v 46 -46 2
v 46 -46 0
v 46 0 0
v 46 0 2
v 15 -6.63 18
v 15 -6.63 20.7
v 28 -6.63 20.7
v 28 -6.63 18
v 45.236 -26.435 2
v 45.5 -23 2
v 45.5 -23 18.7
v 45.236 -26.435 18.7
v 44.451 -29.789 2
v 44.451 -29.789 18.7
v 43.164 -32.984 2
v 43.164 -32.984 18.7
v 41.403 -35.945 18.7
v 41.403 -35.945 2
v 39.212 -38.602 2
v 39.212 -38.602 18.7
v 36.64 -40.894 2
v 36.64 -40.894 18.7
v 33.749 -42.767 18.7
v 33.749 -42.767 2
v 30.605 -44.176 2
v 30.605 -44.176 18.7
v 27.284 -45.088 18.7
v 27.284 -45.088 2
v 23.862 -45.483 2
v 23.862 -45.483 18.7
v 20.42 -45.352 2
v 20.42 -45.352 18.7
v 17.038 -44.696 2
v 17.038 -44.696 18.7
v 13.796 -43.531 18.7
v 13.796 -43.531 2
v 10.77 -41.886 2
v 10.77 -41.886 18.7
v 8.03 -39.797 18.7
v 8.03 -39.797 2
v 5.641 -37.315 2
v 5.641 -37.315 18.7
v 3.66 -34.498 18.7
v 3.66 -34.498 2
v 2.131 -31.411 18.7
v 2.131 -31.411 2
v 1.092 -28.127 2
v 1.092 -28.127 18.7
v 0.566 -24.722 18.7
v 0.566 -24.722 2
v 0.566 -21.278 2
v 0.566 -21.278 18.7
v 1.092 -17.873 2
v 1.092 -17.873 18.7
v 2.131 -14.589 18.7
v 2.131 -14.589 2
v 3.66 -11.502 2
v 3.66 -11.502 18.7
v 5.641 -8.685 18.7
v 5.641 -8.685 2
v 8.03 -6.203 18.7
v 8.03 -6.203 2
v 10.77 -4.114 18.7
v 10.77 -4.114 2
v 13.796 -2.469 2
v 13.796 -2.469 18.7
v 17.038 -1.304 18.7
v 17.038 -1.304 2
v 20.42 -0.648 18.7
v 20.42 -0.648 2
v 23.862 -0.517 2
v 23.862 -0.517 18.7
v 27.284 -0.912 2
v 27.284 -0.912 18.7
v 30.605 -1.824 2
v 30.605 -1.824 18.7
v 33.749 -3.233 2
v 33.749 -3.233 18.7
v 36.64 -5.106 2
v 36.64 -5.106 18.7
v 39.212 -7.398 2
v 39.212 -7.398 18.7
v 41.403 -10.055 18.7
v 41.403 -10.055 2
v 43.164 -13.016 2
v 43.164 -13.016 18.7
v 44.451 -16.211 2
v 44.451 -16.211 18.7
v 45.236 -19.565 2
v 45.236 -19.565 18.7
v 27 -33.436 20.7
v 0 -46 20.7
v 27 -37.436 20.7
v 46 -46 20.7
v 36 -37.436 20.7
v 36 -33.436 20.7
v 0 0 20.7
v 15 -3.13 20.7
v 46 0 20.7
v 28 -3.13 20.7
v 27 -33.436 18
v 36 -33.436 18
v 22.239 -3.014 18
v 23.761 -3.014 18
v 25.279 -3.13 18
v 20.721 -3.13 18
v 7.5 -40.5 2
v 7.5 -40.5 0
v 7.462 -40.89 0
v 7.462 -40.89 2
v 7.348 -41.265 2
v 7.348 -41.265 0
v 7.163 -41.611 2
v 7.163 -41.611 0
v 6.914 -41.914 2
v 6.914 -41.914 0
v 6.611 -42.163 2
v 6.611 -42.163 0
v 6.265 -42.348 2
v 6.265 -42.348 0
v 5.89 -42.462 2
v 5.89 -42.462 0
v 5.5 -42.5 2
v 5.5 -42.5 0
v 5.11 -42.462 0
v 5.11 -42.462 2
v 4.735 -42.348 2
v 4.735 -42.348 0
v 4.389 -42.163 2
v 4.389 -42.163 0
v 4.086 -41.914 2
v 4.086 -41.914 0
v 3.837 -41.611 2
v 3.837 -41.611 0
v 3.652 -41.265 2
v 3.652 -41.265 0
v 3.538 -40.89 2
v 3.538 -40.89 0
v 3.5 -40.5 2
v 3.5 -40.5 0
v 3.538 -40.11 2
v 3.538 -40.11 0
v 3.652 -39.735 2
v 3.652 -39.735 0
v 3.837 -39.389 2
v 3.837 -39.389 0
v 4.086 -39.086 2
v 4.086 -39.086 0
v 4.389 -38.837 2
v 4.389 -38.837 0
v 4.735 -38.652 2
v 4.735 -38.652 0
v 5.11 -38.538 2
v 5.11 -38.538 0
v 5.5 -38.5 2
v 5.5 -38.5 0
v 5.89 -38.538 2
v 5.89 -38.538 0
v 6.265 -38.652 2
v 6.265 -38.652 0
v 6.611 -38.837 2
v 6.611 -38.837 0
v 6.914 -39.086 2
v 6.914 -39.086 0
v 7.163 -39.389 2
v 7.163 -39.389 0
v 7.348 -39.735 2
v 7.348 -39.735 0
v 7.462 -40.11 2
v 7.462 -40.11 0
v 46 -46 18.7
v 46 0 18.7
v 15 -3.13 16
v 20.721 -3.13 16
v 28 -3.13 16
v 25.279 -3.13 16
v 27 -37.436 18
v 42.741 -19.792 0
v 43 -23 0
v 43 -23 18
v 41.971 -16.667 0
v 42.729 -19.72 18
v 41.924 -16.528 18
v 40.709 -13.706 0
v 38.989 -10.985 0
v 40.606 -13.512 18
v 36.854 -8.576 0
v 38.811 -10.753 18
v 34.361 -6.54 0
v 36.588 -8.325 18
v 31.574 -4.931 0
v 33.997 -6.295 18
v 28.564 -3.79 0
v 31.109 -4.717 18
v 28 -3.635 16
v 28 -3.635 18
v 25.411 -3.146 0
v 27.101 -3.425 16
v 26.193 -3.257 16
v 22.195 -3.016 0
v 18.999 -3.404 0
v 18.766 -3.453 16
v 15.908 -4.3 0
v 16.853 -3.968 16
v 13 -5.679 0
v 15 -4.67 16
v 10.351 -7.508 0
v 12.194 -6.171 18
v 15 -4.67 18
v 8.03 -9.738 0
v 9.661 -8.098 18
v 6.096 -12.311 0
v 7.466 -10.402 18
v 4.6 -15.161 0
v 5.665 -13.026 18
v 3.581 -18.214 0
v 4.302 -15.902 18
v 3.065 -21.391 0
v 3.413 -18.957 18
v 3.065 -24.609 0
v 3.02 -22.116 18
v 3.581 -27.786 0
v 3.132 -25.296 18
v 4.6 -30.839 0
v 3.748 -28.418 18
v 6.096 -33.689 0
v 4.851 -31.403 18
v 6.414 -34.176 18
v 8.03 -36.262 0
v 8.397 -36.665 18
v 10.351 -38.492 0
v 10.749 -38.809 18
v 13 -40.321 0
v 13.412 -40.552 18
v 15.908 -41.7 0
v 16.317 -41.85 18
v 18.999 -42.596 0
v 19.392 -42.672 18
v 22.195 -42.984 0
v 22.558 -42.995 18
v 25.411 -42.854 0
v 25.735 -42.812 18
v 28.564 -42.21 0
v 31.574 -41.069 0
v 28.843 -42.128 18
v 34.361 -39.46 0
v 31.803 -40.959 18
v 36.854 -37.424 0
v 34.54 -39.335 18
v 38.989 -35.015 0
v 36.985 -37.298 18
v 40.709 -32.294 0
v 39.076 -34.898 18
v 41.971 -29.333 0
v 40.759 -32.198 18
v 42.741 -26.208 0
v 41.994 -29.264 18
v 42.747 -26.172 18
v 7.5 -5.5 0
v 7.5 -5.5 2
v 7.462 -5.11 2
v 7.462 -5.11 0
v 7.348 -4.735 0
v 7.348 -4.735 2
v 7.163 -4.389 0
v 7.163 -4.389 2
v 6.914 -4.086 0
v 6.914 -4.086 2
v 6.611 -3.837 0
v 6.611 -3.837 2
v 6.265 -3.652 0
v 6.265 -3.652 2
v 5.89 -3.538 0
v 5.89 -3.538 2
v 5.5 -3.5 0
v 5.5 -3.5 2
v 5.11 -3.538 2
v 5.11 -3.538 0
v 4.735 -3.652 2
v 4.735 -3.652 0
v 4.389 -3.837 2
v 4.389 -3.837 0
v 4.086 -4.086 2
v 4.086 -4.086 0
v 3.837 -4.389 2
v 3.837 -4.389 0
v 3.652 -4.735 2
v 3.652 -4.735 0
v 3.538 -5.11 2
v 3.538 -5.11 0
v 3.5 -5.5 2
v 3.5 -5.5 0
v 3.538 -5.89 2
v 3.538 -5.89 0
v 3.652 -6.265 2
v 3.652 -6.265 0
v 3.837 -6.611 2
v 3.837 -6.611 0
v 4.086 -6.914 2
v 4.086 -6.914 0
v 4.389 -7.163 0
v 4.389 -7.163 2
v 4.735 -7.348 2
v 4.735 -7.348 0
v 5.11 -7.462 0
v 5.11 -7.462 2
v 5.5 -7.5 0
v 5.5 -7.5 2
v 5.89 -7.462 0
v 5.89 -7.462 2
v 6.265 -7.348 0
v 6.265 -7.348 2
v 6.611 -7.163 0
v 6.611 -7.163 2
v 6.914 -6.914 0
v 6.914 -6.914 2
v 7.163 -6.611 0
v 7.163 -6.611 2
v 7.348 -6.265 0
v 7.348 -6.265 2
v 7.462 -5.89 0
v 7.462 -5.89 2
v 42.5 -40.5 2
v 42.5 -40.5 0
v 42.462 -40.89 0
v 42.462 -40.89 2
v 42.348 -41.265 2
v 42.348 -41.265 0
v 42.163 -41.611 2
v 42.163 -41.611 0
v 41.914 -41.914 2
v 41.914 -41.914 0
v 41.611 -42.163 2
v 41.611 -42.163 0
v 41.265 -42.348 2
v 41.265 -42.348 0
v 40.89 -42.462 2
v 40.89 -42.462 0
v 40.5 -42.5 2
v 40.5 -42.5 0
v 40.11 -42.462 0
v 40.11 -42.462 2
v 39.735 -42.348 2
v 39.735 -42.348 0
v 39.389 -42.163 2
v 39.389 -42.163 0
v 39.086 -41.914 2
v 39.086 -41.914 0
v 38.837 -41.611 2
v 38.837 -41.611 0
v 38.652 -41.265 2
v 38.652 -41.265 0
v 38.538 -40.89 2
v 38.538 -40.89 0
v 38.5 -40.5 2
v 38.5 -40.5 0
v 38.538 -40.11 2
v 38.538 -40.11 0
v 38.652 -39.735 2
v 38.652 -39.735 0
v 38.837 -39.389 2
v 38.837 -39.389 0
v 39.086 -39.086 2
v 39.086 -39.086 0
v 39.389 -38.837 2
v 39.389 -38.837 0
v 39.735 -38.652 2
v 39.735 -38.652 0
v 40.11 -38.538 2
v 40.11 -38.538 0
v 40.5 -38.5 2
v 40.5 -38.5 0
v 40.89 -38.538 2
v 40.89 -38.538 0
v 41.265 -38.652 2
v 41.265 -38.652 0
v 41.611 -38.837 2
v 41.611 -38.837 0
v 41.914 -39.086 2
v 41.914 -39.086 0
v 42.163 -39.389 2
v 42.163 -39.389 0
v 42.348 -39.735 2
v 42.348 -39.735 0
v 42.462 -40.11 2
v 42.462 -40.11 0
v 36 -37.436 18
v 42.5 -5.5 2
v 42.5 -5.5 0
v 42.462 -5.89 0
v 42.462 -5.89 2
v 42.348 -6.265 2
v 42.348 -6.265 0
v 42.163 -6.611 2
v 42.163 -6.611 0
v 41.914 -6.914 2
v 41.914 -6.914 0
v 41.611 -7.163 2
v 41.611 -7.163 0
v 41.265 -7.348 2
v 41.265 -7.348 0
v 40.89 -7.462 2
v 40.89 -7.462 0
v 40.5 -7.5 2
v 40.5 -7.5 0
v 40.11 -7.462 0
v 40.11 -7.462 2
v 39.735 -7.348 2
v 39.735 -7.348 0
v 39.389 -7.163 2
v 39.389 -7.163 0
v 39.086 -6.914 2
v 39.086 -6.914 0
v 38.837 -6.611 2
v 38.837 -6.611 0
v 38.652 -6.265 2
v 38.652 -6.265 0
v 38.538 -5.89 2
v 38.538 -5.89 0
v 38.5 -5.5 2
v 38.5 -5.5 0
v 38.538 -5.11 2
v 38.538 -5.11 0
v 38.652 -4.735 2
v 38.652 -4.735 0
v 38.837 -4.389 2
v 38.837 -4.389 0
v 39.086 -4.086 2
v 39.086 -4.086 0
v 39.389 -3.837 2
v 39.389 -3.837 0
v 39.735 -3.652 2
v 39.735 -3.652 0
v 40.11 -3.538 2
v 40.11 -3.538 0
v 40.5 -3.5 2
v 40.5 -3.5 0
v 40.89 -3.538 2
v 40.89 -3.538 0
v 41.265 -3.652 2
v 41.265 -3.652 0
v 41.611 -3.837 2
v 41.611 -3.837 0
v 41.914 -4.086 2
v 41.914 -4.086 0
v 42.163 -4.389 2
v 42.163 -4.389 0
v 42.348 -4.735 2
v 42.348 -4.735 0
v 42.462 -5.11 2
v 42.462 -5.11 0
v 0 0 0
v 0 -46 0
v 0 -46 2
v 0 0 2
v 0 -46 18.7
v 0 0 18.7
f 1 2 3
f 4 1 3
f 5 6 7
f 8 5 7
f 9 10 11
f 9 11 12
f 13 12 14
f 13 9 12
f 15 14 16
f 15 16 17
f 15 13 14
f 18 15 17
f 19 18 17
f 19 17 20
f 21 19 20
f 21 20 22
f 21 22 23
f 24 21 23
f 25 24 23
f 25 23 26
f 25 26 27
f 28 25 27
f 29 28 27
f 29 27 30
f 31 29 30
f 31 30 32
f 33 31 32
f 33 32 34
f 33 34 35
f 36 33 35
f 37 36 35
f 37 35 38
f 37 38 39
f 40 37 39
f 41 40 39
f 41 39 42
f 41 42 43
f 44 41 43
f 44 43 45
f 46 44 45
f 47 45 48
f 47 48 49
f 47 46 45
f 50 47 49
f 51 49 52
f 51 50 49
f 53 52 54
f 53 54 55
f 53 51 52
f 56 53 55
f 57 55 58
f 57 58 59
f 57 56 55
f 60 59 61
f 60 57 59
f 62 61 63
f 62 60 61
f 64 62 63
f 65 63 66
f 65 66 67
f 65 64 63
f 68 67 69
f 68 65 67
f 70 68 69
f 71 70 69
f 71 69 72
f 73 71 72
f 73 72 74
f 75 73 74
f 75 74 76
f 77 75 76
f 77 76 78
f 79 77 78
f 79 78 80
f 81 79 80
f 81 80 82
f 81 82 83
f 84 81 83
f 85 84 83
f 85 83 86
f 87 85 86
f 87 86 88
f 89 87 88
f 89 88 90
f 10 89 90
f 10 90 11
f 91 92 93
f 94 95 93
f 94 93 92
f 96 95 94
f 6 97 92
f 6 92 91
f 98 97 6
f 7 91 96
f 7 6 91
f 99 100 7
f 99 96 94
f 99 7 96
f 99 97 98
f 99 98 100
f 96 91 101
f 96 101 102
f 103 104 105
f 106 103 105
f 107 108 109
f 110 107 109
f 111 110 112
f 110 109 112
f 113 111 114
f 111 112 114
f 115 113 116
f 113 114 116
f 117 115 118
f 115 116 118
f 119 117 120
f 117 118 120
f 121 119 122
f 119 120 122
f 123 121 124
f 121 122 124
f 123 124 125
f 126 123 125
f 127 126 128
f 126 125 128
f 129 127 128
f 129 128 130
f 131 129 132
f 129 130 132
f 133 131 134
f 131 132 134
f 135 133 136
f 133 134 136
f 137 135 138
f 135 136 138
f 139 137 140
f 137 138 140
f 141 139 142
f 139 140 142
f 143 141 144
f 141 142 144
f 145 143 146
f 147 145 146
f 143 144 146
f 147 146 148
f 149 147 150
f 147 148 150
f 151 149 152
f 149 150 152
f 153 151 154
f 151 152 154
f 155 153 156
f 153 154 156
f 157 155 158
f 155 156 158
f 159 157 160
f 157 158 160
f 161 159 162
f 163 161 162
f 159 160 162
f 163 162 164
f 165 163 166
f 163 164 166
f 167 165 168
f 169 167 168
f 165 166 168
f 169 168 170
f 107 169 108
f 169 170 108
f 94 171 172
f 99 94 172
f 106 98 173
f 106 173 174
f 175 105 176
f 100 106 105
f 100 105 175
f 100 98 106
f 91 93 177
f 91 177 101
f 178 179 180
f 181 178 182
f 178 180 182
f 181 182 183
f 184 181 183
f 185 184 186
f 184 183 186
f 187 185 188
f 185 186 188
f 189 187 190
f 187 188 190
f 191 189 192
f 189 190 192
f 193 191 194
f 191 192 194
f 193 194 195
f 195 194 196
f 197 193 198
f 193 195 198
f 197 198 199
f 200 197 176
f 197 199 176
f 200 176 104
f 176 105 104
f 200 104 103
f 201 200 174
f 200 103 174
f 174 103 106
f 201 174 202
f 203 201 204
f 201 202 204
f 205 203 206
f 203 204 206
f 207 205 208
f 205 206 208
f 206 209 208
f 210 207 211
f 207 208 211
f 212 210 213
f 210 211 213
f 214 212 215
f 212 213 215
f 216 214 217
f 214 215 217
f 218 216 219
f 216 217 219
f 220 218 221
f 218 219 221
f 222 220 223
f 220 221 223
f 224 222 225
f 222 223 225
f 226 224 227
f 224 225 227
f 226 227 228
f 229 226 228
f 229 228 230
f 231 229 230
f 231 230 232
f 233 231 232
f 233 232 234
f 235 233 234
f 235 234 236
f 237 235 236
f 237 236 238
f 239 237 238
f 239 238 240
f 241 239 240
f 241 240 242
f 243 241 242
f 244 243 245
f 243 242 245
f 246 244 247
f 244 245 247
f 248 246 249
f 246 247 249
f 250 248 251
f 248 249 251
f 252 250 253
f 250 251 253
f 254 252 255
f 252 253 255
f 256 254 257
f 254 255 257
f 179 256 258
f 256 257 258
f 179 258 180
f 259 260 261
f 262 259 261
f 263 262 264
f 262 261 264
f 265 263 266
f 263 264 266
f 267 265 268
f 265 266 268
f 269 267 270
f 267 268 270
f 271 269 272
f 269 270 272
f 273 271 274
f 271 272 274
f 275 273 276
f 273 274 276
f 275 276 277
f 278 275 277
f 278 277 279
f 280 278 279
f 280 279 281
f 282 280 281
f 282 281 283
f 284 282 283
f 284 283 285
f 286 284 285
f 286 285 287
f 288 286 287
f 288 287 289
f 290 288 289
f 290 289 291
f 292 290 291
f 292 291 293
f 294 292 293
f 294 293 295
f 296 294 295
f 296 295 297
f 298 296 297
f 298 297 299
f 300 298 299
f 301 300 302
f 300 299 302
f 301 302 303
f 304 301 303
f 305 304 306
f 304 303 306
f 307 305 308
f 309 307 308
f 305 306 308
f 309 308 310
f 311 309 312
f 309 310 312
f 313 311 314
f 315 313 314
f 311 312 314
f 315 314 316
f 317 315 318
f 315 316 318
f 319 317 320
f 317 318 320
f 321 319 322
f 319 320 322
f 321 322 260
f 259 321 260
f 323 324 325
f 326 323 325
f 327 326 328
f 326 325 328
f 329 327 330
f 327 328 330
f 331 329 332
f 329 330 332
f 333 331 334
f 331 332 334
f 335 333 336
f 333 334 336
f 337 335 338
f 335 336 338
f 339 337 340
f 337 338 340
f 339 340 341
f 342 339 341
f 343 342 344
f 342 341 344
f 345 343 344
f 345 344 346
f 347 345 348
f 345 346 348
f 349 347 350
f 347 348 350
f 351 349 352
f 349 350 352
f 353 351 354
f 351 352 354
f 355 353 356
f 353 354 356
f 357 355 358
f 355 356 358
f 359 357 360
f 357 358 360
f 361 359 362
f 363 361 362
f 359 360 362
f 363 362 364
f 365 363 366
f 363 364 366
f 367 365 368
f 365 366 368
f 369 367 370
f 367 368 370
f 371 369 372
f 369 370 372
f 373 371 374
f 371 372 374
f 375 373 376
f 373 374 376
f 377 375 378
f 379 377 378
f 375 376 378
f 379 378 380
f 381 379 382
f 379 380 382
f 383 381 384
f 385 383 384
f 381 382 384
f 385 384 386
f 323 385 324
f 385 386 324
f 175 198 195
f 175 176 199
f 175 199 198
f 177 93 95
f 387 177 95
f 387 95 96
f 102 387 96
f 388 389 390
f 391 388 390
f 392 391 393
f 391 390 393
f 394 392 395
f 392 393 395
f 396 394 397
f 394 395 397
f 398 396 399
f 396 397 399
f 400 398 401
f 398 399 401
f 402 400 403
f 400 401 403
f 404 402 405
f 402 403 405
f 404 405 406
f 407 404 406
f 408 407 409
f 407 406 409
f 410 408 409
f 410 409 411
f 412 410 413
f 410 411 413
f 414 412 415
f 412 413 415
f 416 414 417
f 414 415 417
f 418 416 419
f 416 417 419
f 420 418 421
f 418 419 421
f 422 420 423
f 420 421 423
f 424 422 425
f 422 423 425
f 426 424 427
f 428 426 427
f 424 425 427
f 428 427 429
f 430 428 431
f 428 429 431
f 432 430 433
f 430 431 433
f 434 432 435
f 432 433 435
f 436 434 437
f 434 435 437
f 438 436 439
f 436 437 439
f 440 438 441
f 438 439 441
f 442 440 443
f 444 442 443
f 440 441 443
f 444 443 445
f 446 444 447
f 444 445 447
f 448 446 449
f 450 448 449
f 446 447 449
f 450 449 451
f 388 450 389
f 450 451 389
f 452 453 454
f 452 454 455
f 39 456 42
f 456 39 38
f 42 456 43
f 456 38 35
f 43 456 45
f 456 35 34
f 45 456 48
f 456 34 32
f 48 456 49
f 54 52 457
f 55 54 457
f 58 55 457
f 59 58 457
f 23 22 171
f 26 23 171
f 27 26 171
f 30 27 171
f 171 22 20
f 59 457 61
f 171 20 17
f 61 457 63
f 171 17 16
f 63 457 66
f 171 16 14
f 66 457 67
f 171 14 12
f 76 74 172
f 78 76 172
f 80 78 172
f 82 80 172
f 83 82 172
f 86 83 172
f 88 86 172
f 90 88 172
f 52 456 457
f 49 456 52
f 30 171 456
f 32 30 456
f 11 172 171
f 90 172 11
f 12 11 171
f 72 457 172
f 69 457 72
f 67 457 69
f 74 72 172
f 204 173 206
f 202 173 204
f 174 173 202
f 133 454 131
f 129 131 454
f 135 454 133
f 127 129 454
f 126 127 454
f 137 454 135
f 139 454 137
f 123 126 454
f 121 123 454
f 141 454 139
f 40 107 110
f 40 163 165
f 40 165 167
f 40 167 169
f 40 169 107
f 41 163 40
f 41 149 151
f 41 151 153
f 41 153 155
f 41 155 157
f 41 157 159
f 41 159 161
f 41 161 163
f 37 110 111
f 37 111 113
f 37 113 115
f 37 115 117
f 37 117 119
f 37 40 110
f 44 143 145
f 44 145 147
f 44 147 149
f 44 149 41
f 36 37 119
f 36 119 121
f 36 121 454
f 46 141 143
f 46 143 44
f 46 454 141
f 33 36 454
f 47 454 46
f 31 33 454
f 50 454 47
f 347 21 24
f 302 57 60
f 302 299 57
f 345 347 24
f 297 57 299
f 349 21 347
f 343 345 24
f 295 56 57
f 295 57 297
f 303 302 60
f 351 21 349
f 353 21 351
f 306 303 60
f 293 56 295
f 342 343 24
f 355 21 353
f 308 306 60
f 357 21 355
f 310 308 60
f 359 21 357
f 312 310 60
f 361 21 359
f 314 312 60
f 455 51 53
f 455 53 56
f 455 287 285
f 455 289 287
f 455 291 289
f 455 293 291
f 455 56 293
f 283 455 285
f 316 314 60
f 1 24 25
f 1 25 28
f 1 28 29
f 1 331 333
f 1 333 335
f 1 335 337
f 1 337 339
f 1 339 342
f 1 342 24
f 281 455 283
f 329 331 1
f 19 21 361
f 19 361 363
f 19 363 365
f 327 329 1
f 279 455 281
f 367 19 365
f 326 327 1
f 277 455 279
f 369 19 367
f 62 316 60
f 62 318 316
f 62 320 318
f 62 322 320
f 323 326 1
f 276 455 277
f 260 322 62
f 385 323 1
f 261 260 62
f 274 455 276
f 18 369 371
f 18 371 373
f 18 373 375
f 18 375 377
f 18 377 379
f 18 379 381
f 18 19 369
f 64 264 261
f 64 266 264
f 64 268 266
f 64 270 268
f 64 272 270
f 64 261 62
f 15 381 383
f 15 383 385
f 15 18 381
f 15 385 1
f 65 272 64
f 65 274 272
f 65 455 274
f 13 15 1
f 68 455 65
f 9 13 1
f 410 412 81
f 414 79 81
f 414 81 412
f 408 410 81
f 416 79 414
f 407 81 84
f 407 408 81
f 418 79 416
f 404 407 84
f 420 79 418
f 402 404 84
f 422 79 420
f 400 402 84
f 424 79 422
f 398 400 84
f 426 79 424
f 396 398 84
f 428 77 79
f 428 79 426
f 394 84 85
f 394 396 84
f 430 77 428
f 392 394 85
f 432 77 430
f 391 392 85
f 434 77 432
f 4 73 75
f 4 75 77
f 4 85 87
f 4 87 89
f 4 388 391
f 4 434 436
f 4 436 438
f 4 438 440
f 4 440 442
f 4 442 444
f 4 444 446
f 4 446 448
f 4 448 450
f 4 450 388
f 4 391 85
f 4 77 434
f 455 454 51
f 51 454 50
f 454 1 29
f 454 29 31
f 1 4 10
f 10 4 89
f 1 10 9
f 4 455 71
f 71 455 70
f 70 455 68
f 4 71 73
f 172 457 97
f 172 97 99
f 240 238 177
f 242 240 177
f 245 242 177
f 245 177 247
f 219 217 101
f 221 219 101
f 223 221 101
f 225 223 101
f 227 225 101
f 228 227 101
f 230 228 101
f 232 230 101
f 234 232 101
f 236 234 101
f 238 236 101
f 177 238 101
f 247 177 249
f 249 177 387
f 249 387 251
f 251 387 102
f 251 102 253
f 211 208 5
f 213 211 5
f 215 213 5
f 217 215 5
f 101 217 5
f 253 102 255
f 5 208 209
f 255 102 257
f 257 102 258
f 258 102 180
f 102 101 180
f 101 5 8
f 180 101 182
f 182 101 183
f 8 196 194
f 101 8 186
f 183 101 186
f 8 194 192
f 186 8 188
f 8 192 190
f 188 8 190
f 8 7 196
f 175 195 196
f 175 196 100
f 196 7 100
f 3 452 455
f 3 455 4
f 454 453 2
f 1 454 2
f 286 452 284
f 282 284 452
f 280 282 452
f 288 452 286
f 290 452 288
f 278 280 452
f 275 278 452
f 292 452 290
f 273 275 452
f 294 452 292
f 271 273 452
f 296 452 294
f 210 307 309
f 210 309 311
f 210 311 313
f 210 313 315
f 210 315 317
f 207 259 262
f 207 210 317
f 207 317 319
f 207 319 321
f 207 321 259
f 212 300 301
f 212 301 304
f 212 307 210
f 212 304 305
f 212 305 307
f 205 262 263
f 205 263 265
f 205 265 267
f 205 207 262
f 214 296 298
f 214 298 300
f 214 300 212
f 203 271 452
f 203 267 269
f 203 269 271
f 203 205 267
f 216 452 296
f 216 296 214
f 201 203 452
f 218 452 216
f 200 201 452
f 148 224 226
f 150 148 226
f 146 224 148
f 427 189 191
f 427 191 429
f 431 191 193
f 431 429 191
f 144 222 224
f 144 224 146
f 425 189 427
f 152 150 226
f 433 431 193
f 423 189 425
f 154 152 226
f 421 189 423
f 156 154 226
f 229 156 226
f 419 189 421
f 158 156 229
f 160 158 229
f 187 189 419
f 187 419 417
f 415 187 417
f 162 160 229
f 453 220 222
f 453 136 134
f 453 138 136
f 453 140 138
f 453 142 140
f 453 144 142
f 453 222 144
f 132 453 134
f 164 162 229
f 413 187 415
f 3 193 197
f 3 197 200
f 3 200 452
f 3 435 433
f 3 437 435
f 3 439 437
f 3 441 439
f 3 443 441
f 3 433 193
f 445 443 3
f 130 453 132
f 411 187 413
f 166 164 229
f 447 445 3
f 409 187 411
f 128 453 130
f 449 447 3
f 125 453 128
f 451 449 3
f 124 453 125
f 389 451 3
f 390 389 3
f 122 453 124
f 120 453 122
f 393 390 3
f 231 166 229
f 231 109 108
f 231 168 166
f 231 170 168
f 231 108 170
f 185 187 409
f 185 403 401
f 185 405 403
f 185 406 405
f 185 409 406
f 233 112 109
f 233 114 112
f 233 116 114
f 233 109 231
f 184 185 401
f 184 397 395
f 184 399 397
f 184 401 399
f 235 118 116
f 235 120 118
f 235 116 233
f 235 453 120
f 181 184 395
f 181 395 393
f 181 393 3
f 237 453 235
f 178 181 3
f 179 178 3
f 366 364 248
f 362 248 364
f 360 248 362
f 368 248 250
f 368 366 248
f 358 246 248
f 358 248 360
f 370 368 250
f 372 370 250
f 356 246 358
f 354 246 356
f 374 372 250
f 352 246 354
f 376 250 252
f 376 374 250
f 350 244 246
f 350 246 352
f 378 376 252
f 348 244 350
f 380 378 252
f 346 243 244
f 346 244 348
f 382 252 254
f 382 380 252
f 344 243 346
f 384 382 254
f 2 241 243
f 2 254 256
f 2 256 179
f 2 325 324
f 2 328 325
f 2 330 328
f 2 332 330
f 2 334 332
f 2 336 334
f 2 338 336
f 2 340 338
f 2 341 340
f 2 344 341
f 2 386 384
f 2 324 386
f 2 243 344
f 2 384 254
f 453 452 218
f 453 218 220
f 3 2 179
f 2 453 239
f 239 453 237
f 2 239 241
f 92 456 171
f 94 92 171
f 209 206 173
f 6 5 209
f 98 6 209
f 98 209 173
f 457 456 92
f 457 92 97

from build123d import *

# Parameters (mm, degrees)
F0_W      = 46
F0_H      = 46
F1_DEPTH  = 2
F2_R      = 2
F3_DEPTH  = 25.4
F4_R      = 22.5
F5_DEPTH  = 20
F6_R      = 20
F7_DEPTH  = 16
F9_W      = 46
F9_H      = 46
F10_DEPTH = 2
F12_W     = 13
F12_H     = 3.5
F13_DEPTH = 4.7
F14_W     = 9
F14_H     = 4
F15_DEPTH = 2.7
F16_R     = 2
F17_DEPTH = 2
F18_R     = 2
F19_DEPTH = 2
F20_R     = 2
F21_DEPTH = 2


with BuildPart() as f1:
    # F0 (on Top) → F1 (new body)
    with BuildSketch(Plane.XY):
        with Locations((23, -23)):
            Rectangle(F0_W, F0_H)
    extrude(amount=F1_DEPTH)

    # F2 (on face) → F3 (cut)
    with BuildSketch(Plane.XY.offset(2)):
        with Locations((5.5, -5.5)):
            Circle(F2_R)
    extrude(amount=-F3_DEPTH, mode=Mode.SUBTRACT)

    # F4 (on face) → F5 (join)
    with BuildSketch(Plane(origin=(0, 0, 0), x_dir=(1, 0, 0), z_dir=(0, 0, -1))):
        with Locations((23, 23)):
            Circle(F4_R)
    extrude(amount=-F5_DEPTH)

    # F6 (on face) → F7 (cut, symmetric)
    with BuildSketch(Plane.XY.offset(2)):
        with Locations((23, -23)):
            Circle(F6_R)
    extrude(amount=F7_DEPTH, both=True, mode=Mode.SUBTRACT)

    # F9 (on offset) → F10 (join)
    with BuildSketch(Plane.XY.offset(18.7)):
        with Locations((23, -23)):
            Rectangle(F9_W, F9_H)
    extrude(amount=F10_DEPTH)

    # F12 (on face) → F13 (cut)
    with BuildSketch(Plane.XY.offset(20.7)):
        with Locations((21.5, -4.8802558407)):
            Rectangle(F12_W, F12_H)
    extrude(amount=-F13_DEPTH, mode=Mode.SUBTRACT)

    # F14 (on face) → F15 (cut)
    with BuildSketch(Plane.XY.offset(20.7)):
        with Locations((31.5, -35.4355278909)):
            Rectangle(F14_W, F14_H)
    extrude(amount=-F15_DEPTH, mode=Mode.SUBTRACT)

    # F16 (on face) → F17 (cut)
    with BuildSketch(Plane(origin=(0, 0, 0), x_dir=(1, 0, 0), z_dir=(0, 0, -1))):
        with Locations((40.5, 40.5)):
            Circle(F16_R)
    extrude(amount=-F17_DEPTH, mode=Mode.SUBTRACT)

    # F18 (on face) → F19 (cut)
    with BuildSketch(Plane(origin=(0, 0, 0), x_dir=(1, 0, 0), z_dir=(0, 0, -1))):
        with Locations((40.5, 5.5)):
            Circle(F18_R)
    extrude(amount=-F19_DEPTH, mode=Mode.SUBTRACT)

    # F20 (on face) → F21 (cut)
    with BuildSketch(Plane(origin=(0, 0, 0), x_dir=(1, 0, 0), z_dir=(0, 0, -1))):
        with Locations((5.5, 40.5)):
            Circle(F20_R)
    extrude(amount=-F21_DEPTH, mode=Mode.SUBTRACT)


solid = f1.part
